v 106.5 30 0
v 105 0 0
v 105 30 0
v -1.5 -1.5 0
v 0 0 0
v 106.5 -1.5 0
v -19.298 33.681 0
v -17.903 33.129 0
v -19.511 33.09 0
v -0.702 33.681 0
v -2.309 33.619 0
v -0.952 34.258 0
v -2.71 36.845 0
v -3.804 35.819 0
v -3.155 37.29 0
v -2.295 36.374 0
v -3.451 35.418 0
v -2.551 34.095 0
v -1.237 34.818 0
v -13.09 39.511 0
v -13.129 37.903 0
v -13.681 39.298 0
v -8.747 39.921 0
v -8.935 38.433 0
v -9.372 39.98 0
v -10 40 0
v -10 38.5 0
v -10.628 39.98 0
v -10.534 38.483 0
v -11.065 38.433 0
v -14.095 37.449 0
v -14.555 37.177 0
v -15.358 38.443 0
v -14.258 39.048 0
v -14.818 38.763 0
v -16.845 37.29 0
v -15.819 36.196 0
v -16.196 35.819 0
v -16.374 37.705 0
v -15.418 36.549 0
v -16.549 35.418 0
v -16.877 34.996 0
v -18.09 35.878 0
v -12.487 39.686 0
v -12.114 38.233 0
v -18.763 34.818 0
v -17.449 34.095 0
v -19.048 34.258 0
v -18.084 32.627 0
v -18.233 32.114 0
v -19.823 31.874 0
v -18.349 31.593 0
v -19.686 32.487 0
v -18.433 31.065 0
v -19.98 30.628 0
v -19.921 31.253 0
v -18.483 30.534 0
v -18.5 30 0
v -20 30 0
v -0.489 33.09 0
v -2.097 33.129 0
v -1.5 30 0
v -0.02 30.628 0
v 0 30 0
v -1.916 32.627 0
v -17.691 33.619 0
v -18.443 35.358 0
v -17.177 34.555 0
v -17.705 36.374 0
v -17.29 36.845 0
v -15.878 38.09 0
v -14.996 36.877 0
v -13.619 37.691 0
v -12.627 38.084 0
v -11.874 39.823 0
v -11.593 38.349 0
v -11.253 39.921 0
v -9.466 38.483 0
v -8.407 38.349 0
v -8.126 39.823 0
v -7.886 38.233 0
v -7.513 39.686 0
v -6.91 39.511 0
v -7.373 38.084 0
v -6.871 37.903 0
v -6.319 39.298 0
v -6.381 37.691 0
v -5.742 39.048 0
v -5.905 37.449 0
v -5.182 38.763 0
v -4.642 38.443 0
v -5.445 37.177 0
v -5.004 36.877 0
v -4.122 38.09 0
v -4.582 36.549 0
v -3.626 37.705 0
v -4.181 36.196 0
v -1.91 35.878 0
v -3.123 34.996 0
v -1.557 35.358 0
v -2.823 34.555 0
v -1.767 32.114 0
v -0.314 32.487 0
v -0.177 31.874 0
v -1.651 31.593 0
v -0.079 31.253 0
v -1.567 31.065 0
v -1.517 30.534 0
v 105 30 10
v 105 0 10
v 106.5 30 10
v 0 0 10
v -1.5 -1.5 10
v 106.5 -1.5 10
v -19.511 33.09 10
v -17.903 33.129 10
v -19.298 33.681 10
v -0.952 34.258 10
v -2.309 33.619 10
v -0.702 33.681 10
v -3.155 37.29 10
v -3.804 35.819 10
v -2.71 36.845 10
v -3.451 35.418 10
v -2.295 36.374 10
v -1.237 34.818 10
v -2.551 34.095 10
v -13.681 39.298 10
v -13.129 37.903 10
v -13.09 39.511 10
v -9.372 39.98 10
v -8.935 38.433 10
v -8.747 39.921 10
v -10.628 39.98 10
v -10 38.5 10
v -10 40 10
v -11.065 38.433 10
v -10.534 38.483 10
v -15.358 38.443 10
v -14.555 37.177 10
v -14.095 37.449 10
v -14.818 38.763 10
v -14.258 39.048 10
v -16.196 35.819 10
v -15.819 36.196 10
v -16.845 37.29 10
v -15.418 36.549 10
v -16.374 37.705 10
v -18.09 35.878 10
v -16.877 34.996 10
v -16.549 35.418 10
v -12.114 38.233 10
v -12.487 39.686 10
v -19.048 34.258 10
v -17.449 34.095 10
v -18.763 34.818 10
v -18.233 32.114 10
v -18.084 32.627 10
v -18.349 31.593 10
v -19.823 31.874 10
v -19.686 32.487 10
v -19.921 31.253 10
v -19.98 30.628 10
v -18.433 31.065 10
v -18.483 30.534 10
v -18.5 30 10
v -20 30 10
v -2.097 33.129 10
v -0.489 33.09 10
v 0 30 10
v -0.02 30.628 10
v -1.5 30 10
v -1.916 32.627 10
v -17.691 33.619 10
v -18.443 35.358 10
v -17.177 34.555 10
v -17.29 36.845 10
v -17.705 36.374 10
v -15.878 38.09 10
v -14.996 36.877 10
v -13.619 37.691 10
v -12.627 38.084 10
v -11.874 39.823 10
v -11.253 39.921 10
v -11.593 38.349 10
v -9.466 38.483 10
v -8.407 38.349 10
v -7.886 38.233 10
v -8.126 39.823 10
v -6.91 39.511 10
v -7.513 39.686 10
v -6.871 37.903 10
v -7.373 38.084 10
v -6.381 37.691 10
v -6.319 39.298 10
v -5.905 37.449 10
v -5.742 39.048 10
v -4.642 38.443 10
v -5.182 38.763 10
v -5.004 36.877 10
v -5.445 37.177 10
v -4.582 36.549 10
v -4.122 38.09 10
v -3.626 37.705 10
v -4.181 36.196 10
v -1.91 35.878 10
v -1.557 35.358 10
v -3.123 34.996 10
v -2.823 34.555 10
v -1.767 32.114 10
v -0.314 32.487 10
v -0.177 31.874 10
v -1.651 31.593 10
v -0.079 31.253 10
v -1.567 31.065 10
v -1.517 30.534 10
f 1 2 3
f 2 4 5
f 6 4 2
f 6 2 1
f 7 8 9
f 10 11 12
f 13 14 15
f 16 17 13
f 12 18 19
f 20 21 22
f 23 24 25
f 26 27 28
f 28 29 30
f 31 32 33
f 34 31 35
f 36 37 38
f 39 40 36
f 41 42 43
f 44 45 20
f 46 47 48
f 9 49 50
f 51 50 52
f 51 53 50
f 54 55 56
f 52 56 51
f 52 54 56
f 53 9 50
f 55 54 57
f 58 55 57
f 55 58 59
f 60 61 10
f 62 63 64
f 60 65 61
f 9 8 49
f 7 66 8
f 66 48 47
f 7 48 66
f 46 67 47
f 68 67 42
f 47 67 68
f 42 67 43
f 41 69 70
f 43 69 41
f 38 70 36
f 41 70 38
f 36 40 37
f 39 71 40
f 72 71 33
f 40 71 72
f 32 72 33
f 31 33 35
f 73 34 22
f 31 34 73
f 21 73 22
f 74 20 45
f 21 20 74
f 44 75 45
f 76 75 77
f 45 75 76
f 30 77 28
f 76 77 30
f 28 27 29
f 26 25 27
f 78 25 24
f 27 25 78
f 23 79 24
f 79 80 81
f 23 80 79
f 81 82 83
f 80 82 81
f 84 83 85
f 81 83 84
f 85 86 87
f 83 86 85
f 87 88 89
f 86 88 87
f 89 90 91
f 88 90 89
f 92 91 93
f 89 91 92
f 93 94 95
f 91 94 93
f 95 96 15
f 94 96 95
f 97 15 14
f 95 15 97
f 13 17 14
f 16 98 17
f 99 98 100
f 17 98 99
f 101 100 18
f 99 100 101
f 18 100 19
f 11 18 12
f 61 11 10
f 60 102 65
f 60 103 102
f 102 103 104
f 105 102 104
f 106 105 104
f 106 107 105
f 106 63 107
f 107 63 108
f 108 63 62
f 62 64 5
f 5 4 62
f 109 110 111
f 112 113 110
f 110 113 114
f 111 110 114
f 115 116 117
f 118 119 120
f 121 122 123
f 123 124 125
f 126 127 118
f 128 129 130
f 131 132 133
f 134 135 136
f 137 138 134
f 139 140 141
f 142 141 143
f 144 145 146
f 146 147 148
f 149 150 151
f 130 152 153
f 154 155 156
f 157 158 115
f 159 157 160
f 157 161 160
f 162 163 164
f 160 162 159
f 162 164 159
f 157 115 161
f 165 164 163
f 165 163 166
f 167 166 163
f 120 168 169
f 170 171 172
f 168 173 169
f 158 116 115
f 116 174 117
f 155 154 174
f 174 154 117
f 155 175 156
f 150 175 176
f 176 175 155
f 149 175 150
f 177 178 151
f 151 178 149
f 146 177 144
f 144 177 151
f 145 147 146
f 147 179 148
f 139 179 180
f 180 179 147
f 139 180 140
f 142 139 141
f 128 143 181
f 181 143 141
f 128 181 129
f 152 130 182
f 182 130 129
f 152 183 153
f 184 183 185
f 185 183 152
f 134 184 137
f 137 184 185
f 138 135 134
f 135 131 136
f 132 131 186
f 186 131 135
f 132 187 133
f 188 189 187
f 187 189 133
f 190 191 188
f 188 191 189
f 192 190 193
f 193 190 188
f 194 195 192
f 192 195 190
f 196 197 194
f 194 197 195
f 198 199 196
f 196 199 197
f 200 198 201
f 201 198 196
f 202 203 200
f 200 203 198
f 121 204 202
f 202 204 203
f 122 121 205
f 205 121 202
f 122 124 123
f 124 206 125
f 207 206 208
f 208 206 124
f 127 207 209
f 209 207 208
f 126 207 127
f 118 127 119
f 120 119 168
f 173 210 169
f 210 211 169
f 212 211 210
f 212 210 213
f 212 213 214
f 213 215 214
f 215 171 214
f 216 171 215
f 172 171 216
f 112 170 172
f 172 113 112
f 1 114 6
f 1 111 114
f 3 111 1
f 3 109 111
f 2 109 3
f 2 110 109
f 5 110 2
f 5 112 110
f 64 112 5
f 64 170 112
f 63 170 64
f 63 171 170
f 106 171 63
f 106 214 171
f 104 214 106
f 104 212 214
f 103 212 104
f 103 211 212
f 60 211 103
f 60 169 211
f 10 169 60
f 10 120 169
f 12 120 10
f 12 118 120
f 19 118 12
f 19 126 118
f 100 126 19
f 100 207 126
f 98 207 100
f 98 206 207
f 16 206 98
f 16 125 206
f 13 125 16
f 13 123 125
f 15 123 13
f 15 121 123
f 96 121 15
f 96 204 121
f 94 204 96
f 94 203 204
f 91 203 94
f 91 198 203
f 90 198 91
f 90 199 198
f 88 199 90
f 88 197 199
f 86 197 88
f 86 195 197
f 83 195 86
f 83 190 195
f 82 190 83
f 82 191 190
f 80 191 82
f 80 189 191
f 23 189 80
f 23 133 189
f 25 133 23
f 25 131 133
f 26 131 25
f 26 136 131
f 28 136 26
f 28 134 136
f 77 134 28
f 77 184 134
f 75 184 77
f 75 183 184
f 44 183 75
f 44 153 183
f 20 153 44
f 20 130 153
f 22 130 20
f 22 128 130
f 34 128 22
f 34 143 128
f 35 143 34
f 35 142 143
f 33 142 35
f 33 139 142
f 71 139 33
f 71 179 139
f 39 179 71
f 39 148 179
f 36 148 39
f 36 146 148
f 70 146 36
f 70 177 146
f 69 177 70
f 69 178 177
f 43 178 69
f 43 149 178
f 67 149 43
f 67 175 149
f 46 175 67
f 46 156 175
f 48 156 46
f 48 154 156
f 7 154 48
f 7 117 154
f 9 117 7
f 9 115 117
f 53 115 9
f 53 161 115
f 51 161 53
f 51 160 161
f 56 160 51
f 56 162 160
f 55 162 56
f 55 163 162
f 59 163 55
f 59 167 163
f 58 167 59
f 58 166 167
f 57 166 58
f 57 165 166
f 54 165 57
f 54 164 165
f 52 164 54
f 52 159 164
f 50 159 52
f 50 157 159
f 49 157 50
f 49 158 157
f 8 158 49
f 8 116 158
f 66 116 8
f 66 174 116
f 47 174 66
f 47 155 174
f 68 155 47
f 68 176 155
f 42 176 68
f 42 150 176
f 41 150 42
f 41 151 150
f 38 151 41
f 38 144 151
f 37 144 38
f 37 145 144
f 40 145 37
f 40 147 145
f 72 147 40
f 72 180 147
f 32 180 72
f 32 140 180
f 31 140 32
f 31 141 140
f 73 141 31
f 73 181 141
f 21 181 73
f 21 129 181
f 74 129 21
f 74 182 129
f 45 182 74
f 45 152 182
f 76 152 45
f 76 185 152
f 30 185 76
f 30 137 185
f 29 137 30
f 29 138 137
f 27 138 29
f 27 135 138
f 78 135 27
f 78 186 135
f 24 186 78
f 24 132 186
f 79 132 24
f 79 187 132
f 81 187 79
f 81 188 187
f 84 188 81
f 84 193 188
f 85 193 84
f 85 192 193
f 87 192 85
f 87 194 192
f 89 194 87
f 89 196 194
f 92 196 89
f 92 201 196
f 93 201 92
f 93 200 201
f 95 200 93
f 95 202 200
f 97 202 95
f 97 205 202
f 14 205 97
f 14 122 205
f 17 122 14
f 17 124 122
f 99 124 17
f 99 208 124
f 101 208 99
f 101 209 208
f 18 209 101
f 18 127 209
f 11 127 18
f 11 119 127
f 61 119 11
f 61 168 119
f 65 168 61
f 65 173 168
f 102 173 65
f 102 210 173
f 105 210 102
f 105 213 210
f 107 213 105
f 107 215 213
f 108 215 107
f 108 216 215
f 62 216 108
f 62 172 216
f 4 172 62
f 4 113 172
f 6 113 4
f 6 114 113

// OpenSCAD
wall_thickness = 105;
grip_length = 30;
hook_diameter = 20;
hook_length = 40;
width = 10;
thickness = 1.5;

linear_extrude(height = width) {
  translate ([-thickness, -thickness]) {
    square([wall_thickness + 2*thickness, thickness]);
  }
  translate ([wall_thickness + thickness, 0]) {
    rotate(90) {
      square([grip_length, thickness]);
    }
  }
  rotate(90) {
    square([hook_length - hook_diameter/2, thickness]);
  }
  translate([-hook_diameter/2, hook_length - hook_diameter/2]) {
    rotate(180) {
      difference() {
        circle(d = hook_diameter, $fn = 100);
        circle(d = hook_diameter - 2*thickness, $fn = 100);
        translate([-2*hook_diameter, 0]) {
          square([4*hook_diameter, 2*hook_diameter]);
        }
      }
    }
  }
}
